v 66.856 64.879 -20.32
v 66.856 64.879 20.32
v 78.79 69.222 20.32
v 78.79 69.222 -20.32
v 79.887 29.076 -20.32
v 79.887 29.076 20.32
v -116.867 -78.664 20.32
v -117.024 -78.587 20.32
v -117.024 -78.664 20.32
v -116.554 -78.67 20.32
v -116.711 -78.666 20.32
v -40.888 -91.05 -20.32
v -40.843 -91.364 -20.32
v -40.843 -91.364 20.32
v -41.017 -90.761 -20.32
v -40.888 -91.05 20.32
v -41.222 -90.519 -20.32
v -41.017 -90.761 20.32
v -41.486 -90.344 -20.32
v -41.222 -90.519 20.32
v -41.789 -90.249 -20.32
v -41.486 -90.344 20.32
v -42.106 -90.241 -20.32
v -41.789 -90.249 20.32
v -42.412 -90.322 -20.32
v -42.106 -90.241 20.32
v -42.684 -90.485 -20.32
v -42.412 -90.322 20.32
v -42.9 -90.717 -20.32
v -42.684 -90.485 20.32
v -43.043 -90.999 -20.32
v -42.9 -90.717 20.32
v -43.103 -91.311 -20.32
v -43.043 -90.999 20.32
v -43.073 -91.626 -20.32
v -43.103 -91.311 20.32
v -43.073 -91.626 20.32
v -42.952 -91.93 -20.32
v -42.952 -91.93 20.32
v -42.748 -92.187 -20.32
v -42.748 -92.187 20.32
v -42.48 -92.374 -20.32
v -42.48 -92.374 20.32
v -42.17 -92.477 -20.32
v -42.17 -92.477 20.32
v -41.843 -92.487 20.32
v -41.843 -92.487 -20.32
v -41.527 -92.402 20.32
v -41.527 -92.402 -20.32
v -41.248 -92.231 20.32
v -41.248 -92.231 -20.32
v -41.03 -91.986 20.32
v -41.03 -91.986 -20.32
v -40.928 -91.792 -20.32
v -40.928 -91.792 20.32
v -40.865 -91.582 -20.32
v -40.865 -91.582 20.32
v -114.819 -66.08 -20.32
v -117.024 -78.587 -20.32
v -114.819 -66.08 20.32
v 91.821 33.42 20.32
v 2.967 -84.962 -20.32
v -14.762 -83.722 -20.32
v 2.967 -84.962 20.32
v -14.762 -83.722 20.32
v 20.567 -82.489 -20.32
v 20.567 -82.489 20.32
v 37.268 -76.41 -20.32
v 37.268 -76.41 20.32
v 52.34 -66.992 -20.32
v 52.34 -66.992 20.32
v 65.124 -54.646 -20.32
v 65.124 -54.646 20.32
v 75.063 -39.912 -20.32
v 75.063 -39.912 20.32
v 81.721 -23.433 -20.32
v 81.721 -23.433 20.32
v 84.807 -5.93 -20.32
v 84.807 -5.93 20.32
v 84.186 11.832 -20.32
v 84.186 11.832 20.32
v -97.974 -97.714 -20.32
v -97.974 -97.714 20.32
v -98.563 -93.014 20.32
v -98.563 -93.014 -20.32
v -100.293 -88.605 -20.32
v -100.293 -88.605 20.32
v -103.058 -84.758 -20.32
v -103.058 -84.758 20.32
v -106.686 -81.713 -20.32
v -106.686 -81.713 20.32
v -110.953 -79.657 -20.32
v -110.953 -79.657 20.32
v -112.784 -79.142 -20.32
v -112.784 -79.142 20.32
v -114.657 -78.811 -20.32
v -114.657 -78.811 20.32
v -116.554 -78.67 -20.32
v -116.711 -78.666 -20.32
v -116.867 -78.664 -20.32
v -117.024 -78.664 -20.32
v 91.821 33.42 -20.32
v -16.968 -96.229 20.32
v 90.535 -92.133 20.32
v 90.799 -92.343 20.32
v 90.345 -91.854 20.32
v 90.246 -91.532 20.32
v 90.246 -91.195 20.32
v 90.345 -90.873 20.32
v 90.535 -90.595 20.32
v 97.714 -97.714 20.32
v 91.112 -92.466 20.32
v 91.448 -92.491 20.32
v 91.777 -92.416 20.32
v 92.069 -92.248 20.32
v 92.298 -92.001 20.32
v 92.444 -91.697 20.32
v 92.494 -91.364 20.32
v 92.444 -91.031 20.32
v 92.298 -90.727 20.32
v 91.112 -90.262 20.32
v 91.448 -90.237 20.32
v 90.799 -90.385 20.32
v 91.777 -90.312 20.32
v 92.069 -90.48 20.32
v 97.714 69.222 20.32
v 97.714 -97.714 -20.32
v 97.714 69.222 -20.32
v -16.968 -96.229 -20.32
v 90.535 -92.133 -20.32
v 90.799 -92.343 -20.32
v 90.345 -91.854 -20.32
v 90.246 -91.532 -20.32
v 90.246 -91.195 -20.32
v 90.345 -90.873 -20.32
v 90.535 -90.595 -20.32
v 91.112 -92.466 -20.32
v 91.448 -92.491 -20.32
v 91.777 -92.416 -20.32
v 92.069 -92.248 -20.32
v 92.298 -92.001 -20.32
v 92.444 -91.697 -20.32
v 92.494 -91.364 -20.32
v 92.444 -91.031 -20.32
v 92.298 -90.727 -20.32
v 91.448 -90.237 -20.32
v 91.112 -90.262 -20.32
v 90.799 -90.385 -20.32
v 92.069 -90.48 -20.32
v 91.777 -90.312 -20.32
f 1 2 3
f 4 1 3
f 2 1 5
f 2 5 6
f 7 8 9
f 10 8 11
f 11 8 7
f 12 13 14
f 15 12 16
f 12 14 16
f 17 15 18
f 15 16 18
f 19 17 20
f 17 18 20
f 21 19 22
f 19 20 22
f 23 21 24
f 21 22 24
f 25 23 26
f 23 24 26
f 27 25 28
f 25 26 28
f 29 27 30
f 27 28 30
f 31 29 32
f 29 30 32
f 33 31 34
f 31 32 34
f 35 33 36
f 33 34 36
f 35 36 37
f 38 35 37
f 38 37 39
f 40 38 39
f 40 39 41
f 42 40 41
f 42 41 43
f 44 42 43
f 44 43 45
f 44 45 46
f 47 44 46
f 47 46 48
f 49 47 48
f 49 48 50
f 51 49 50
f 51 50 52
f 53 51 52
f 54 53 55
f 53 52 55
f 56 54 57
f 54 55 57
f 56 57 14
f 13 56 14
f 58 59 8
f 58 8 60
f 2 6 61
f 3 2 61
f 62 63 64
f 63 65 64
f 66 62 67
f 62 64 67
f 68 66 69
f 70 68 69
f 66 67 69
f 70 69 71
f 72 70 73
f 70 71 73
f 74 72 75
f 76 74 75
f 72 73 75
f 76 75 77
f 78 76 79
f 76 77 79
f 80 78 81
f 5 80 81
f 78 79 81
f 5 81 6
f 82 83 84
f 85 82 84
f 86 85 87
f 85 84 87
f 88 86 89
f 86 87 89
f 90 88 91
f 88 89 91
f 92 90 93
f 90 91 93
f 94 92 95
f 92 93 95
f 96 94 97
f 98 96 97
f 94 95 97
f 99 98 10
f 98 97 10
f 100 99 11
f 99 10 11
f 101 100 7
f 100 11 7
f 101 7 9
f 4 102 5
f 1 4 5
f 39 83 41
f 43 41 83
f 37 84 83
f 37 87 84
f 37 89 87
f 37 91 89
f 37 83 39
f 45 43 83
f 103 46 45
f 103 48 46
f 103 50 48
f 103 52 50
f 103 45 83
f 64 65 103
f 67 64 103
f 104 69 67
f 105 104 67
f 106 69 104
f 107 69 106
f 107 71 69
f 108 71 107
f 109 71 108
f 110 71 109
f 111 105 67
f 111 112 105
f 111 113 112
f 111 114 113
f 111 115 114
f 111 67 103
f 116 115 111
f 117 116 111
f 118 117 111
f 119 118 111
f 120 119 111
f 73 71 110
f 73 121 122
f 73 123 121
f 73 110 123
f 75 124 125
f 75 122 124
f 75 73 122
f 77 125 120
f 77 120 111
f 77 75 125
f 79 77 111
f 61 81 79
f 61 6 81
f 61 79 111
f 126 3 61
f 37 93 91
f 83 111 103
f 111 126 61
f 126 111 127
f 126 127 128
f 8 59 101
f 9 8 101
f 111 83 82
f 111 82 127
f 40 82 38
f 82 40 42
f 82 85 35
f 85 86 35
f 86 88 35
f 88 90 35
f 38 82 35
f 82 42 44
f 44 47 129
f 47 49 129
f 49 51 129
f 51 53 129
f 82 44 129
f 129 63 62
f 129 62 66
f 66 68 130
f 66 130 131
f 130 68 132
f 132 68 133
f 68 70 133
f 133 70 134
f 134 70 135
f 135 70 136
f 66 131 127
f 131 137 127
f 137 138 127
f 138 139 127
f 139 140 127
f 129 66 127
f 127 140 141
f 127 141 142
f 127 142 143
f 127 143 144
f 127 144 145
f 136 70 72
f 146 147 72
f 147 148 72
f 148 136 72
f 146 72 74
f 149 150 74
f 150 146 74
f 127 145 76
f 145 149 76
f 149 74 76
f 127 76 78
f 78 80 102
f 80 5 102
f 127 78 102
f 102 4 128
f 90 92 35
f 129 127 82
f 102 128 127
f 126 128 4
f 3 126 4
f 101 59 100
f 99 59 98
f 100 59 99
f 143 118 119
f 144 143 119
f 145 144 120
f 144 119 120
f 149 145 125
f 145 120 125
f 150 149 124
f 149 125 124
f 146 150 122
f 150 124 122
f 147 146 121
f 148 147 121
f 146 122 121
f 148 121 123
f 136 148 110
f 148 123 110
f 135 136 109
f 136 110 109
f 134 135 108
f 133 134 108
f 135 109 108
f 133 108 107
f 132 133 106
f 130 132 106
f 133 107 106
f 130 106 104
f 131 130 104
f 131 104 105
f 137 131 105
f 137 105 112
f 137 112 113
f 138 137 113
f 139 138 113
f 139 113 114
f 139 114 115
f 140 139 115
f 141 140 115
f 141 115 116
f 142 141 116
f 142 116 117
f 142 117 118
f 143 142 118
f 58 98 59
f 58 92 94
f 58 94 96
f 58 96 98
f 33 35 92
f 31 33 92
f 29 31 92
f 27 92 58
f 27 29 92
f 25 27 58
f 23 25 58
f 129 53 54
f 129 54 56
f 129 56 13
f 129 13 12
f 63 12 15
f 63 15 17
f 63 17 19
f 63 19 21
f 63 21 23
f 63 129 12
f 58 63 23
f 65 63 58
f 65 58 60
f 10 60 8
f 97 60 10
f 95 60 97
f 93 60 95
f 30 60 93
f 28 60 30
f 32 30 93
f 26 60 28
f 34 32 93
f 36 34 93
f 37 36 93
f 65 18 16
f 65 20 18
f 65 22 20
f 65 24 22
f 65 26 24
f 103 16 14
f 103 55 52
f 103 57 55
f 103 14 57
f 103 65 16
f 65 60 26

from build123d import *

# Parameters (mm, degrees)
BOSS_EXTRUDE1_DEPTH = 40.64
SKETCH6_R           = 1.1303
CUT_EXTRUDE1_DEPTH  = 158.779215984
SKETCH7_R           = 19.05
CUT_EXTRUDE2_DEPTH  = 158.779215984


with BuildPart() as part:
    # Sweep3: sweep along a path in Sketch2
    with BuildLine(Plane.XY) as sweep3_path:
        Line((-111.378641457, -46.568583299), (-11.322173751, -64.21123815))
        ThreePointArc((-11.322173751, -64.21123815), (49.947476571, -41.910909169), (61.269650322, 22.300328981))
        Line((61.269650322, 22.300328981), (48.238682861, 58.102617833))
    # 3DSketch1 → Sweep3 (sweep)
    with BuildSketch(Plane(origin=(-117.024291009, -78.586652965, -20.32), x_dir=(0.051794909001673446, 0.2937435257699459, 0.9544799780350292), z_dir=(0.984807753012208, -0.17364817766693055, 0))):
        Polygon((0, 0), (3.788092413, -12.121895721), (42.57815872, 0), (38.790066307, 12.121895721), align=None)
    sweep(path=sweep3_path.line)

    # Sketch5 → Boss-Extrude1 (add)
    with BuildSketch(Plane.XY.offset(20.32)):
        with BuildLine():
            Line((-16.967823303, -96.229307816), (-117.024291009, -78.586652965))
            Line((-117.024291009, -78.586652965), (-117.024291009, -97.7138))
            Line((-117.024291009, -97.7138), (-1.15e-07, -97.7138))
            ThreePointArc((-1.15e-07, -97.7138), (-8.516318873, -97.341969485), (-16.967823303, -96.229307816))
        make_face()
        with BuildLine():
            ThreePointArc((97.7138, 1.15e-07), (69.094090596, -69.094090596), (-1.15e-07, -97.7138))
            Line((-1.15e-07, -97.7138), (97.7138, -97.7138))
            Line((97.7138, -97.7138), (97.7138, 1.15e-07))
        make_face()
        with BuildLine():
            ThreePointArc((91.820936809, 33.420087881), (96.229307806, 16.96782336), (97.7138, 1.15e-07))
            Line((97.7138, 1.15e-07), (97.7138, 69.222376733))
            Line((97.7138, 69.222376733), (78.789969348, 69.222376733))
            Line((78.789969348, 69.222376733), (91.820936809, 33.420087881))
        make_face()
    extrude(amount=-BOSS_EXTRUDE1_DEPTH)

    # Sketch6 → Cut-Extrude1 (cut, through all)
    with BuildSketch(Plane.XY.offset(20.32)):
        with Locations((91.3638, -91.3638)):
            Circle(SKETCH6_R)
        with Locations((-41.9735, -91.3638)):
            Circle(SKETCH6_R)
    extrude(amount=-CUT_EXTRUDE1_DEPTH, mode=Mode.SUBTRACT)

    # Sketch7 → Cut-Extrude2 (cut, through all)
    with BuildSketch(Plane.XY.offset(20.32)):
        with Locations((-117.024291009, -97.7138)):
            Circle(SKETCH7_R)
    extrude(amount=-CUT_EXTRUDE2_DEPTH, mode=Mode.SUBTRACT)


solid = part.part
